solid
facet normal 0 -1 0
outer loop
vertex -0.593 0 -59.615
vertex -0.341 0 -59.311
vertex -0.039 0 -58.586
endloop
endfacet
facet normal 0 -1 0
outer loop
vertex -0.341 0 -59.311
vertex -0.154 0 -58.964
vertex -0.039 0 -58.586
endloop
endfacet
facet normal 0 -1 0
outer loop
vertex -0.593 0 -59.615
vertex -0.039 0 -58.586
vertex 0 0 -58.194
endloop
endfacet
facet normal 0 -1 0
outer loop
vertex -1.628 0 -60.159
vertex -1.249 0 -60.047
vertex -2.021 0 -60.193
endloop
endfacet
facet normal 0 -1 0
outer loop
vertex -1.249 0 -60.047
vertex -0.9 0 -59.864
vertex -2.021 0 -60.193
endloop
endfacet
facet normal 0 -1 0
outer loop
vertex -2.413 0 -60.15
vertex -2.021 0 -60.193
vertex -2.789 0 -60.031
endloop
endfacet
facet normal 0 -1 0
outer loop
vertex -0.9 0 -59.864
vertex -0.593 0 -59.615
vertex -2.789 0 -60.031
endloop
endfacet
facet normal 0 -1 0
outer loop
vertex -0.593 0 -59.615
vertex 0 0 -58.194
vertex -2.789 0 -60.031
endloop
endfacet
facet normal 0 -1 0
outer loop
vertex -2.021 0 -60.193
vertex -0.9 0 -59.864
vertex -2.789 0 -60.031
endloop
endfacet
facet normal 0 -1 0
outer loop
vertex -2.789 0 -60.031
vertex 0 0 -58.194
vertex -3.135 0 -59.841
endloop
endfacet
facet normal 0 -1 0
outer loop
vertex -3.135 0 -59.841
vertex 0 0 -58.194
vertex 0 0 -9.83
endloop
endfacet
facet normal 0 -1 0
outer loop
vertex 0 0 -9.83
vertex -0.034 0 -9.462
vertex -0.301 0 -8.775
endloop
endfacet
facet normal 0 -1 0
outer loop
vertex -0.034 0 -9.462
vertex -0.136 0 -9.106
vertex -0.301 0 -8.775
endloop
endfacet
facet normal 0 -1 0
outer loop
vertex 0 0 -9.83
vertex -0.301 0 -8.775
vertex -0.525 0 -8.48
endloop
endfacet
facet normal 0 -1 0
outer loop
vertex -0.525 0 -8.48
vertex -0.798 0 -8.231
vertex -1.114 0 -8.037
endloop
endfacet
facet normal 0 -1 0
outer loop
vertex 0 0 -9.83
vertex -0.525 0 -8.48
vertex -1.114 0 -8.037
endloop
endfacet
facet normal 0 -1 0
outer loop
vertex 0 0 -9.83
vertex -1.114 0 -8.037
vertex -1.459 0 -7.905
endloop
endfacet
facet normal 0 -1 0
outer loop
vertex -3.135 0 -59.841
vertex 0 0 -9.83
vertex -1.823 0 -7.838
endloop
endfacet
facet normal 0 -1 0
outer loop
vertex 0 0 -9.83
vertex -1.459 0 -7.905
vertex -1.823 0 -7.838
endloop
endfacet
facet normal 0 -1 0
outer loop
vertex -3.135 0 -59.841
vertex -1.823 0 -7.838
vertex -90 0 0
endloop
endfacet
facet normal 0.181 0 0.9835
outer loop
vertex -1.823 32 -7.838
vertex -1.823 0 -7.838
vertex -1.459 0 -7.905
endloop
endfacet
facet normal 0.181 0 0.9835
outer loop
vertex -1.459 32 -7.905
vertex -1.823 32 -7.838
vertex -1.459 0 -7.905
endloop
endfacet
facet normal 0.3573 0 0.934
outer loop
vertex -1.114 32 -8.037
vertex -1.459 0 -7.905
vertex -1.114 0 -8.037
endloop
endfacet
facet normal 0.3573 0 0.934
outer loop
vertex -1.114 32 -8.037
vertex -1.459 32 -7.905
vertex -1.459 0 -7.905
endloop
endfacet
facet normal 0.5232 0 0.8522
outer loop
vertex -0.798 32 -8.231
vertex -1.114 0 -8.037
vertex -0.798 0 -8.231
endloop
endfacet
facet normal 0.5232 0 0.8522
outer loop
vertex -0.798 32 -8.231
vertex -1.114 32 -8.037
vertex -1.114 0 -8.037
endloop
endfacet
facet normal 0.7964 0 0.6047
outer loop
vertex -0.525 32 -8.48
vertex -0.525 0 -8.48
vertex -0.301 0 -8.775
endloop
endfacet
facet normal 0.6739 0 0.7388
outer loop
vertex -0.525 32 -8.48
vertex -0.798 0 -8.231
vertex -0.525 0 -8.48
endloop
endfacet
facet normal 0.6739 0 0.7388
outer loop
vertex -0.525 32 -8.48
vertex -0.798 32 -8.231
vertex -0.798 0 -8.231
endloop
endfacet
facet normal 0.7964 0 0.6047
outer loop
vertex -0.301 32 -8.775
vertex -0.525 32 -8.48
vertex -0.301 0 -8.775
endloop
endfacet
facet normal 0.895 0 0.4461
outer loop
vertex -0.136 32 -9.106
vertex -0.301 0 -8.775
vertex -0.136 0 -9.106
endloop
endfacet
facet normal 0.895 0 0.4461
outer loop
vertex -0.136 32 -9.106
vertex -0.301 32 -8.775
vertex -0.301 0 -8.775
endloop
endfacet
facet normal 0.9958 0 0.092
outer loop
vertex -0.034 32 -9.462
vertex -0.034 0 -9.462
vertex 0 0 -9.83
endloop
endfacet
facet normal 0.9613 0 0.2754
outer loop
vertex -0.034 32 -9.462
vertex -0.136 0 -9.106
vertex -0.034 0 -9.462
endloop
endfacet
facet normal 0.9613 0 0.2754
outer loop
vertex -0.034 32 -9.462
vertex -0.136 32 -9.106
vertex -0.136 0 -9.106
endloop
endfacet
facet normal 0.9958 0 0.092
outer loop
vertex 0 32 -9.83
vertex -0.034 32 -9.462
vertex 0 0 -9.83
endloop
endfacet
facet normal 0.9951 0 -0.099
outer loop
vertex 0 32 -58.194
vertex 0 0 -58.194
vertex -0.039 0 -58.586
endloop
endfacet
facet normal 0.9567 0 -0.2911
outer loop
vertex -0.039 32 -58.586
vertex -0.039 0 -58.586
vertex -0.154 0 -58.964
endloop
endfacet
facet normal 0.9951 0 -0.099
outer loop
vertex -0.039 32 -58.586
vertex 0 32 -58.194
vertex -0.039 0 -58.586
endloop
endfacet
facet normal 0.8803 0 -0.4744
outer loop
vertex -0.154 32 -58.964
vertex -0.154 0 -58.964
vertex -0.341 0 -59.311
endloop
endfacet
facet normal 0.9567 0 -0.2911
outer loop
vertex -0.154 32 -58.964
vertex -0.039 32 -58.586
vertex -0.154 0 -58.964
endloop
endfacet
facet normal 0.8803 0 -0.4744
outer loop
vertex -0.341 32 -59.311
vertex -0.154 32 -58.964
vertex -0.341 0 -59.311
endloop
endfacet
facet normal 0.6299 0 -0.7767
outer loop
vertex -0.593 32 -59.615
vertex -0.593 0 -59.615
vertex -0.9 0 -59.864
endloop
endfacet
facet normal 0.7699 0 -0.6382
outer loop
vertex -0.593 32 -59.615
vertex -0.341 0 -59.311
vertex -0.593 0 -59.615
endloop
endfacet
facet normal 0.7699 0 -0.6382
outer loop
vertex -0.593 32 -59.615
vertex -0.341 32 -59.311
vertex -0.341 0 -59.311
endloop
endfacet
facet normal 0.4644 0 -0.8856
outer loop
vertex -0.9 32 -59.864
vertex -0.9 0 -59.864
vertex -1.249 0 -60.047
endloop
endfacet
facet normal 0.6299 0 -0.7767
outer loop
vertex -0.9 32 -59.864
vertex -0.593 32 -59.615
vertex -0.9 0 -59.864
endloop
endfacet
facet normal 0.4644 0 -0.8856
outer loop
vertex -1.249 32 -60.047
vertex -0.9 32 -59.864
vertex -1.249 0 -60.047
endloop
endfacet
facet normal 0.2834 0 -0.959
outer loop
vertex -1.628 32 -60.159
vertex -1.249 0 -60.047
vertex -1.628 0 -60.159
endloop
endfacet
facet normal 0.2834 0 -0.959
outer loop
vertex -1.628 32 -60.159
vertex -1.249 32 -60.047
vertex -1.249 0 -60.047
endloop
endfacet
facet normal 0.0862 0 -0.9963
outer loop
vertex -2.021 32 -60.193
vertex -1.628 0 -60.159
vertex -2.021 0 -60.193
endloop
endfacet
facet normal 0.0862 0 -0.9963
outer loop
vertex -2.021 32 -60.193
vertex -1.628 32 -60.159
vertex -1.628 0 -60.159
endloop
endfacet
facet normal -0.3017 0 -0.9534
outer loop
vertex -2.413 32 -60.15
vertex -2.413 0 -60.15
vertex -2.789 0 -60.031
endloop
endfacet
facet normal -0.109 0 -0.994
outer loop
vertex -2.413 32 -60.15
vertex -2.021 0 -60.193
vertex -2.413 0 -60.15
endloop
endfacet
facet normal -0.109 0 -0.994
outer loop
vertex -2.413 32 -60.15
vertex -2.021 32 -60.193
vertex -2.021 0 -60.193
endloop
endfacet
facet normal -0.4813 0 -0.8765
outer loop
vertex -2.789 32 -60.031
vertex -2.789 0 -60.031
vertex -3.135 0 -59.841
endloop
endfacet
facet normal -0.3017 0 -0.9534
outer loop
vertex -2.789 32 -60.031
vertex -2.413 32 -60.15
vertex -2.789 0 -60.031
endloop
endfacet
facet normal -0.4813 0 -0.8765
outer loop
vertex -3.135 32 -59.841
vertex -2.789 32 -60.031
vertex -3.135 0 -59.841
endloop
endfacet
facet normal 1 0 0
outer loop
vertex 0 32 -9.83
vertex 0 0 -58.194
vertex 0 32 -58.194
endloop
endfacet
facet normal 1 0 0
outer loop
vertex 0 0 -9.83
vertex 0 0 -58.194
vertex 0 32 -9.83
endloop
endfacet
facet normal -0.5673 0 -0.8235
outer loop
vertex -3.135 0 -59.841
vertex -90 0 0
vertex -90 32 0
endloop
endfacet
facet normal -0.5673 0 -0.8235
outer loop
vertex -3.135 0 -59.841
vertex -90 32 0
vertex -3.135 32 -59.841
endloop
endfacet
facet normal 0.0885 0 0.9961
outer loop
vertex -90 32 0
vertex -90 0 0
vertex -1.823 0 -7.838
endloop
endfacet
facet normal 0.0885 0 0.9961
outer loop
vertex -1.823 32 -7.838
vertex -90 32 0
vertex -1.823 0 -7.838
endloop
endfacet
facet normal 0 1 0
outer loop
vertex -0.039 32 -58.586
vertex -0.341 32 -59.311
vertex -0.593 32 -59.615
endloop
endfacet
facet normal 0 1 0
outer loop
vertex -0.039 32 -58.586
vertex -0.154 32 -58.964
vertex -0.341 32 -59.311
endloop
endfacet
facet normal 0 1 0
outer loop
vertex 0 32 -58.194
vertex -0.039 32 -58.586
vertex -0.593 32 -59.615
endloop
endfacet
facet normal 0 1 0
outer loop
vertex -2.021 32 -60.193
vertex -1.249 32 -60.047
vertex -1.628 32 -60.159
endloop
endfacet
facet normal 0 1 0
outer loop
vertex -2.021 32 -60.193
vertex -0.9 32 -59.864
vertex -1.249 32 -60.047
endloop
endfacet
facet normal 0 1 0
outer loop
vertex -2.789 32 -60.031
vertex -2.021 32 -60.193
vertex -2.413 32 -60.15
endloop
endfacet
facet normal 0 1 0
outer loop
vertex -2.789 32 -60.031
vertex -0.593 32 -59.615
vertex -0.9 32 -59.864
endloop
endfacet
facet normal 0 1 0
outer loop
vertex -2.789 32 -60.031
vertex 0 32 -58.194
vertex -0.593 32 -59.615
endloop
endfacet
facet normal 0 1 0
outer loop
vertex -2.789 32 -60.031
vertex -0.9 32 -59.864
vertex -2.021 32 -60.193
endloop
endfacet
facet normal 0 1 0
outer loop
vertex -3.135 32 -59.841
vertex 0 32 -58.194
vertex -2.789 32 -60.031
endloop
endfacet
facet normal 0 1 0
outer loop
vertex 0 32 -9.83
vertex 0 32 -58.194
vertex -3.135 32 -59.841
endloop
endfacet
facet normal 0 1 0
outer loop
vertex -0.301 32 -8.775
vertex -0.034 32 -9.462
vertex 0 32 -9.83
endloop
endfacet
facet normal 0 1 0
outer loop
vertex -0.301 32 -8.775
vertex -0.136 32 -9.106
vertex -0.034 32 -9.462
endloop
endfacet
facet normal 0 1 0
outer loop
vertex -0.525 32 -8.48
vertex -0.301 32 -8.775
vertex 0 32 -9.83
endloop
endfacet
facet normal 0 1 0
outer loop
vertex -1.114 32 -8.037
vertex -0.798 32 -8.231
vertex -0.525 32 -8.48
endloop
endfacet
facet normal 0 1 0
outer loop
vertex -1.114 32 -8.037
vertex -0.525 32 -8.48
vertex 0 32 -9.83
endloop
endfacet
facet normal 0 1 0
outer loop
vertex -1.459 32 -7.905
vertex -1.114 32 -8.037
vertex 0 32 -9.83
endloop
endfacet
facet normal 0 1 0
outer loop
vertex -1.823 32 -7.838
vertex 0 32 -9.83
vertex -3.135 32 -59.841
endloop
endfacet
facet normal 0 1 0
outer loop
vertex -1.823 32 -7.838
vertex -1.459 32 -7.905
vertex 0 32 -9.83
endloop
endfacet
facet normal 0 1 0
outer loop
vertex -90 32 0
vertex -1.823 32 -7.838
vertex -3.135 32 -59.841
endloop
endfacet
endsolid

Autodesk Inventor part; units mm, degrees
ref_plane "YZ Plane" through (0, 0, 0) normal (1, 0, 0) x (0, 1, 0)
ref_plane "XZ Plane" through (0, 0, 0) normal (0, 1, 0) x (-1, 0, 0)
ref_plane "XY Plane" through (0, 0, 0) normal (0, 0, 1) x (1, 0, 0)
sketch "Sketch1" plane through (0, 0, 0) normal (0, 1, 0) x (-1, 0, 0)
  line L0 (0, 0) -> (90, 0)
  line L1 (90, 0) -> (0, -62)
  line L2 (0, -62) -> (0, 0)
  line L3 (90, 0) -> (0, -8)
  dimension "d8" = 90
  dimension "d9" = 62
  dimension "d10" = 54
extrude "Extrusion1" add sketch "Sketch1" along normal blind 32 contours L1 L2 L3
fillet "Fillet3" radius 2 2 edges at (0, 16, -8) (0, 16, -62)
properties part number "ramp"
